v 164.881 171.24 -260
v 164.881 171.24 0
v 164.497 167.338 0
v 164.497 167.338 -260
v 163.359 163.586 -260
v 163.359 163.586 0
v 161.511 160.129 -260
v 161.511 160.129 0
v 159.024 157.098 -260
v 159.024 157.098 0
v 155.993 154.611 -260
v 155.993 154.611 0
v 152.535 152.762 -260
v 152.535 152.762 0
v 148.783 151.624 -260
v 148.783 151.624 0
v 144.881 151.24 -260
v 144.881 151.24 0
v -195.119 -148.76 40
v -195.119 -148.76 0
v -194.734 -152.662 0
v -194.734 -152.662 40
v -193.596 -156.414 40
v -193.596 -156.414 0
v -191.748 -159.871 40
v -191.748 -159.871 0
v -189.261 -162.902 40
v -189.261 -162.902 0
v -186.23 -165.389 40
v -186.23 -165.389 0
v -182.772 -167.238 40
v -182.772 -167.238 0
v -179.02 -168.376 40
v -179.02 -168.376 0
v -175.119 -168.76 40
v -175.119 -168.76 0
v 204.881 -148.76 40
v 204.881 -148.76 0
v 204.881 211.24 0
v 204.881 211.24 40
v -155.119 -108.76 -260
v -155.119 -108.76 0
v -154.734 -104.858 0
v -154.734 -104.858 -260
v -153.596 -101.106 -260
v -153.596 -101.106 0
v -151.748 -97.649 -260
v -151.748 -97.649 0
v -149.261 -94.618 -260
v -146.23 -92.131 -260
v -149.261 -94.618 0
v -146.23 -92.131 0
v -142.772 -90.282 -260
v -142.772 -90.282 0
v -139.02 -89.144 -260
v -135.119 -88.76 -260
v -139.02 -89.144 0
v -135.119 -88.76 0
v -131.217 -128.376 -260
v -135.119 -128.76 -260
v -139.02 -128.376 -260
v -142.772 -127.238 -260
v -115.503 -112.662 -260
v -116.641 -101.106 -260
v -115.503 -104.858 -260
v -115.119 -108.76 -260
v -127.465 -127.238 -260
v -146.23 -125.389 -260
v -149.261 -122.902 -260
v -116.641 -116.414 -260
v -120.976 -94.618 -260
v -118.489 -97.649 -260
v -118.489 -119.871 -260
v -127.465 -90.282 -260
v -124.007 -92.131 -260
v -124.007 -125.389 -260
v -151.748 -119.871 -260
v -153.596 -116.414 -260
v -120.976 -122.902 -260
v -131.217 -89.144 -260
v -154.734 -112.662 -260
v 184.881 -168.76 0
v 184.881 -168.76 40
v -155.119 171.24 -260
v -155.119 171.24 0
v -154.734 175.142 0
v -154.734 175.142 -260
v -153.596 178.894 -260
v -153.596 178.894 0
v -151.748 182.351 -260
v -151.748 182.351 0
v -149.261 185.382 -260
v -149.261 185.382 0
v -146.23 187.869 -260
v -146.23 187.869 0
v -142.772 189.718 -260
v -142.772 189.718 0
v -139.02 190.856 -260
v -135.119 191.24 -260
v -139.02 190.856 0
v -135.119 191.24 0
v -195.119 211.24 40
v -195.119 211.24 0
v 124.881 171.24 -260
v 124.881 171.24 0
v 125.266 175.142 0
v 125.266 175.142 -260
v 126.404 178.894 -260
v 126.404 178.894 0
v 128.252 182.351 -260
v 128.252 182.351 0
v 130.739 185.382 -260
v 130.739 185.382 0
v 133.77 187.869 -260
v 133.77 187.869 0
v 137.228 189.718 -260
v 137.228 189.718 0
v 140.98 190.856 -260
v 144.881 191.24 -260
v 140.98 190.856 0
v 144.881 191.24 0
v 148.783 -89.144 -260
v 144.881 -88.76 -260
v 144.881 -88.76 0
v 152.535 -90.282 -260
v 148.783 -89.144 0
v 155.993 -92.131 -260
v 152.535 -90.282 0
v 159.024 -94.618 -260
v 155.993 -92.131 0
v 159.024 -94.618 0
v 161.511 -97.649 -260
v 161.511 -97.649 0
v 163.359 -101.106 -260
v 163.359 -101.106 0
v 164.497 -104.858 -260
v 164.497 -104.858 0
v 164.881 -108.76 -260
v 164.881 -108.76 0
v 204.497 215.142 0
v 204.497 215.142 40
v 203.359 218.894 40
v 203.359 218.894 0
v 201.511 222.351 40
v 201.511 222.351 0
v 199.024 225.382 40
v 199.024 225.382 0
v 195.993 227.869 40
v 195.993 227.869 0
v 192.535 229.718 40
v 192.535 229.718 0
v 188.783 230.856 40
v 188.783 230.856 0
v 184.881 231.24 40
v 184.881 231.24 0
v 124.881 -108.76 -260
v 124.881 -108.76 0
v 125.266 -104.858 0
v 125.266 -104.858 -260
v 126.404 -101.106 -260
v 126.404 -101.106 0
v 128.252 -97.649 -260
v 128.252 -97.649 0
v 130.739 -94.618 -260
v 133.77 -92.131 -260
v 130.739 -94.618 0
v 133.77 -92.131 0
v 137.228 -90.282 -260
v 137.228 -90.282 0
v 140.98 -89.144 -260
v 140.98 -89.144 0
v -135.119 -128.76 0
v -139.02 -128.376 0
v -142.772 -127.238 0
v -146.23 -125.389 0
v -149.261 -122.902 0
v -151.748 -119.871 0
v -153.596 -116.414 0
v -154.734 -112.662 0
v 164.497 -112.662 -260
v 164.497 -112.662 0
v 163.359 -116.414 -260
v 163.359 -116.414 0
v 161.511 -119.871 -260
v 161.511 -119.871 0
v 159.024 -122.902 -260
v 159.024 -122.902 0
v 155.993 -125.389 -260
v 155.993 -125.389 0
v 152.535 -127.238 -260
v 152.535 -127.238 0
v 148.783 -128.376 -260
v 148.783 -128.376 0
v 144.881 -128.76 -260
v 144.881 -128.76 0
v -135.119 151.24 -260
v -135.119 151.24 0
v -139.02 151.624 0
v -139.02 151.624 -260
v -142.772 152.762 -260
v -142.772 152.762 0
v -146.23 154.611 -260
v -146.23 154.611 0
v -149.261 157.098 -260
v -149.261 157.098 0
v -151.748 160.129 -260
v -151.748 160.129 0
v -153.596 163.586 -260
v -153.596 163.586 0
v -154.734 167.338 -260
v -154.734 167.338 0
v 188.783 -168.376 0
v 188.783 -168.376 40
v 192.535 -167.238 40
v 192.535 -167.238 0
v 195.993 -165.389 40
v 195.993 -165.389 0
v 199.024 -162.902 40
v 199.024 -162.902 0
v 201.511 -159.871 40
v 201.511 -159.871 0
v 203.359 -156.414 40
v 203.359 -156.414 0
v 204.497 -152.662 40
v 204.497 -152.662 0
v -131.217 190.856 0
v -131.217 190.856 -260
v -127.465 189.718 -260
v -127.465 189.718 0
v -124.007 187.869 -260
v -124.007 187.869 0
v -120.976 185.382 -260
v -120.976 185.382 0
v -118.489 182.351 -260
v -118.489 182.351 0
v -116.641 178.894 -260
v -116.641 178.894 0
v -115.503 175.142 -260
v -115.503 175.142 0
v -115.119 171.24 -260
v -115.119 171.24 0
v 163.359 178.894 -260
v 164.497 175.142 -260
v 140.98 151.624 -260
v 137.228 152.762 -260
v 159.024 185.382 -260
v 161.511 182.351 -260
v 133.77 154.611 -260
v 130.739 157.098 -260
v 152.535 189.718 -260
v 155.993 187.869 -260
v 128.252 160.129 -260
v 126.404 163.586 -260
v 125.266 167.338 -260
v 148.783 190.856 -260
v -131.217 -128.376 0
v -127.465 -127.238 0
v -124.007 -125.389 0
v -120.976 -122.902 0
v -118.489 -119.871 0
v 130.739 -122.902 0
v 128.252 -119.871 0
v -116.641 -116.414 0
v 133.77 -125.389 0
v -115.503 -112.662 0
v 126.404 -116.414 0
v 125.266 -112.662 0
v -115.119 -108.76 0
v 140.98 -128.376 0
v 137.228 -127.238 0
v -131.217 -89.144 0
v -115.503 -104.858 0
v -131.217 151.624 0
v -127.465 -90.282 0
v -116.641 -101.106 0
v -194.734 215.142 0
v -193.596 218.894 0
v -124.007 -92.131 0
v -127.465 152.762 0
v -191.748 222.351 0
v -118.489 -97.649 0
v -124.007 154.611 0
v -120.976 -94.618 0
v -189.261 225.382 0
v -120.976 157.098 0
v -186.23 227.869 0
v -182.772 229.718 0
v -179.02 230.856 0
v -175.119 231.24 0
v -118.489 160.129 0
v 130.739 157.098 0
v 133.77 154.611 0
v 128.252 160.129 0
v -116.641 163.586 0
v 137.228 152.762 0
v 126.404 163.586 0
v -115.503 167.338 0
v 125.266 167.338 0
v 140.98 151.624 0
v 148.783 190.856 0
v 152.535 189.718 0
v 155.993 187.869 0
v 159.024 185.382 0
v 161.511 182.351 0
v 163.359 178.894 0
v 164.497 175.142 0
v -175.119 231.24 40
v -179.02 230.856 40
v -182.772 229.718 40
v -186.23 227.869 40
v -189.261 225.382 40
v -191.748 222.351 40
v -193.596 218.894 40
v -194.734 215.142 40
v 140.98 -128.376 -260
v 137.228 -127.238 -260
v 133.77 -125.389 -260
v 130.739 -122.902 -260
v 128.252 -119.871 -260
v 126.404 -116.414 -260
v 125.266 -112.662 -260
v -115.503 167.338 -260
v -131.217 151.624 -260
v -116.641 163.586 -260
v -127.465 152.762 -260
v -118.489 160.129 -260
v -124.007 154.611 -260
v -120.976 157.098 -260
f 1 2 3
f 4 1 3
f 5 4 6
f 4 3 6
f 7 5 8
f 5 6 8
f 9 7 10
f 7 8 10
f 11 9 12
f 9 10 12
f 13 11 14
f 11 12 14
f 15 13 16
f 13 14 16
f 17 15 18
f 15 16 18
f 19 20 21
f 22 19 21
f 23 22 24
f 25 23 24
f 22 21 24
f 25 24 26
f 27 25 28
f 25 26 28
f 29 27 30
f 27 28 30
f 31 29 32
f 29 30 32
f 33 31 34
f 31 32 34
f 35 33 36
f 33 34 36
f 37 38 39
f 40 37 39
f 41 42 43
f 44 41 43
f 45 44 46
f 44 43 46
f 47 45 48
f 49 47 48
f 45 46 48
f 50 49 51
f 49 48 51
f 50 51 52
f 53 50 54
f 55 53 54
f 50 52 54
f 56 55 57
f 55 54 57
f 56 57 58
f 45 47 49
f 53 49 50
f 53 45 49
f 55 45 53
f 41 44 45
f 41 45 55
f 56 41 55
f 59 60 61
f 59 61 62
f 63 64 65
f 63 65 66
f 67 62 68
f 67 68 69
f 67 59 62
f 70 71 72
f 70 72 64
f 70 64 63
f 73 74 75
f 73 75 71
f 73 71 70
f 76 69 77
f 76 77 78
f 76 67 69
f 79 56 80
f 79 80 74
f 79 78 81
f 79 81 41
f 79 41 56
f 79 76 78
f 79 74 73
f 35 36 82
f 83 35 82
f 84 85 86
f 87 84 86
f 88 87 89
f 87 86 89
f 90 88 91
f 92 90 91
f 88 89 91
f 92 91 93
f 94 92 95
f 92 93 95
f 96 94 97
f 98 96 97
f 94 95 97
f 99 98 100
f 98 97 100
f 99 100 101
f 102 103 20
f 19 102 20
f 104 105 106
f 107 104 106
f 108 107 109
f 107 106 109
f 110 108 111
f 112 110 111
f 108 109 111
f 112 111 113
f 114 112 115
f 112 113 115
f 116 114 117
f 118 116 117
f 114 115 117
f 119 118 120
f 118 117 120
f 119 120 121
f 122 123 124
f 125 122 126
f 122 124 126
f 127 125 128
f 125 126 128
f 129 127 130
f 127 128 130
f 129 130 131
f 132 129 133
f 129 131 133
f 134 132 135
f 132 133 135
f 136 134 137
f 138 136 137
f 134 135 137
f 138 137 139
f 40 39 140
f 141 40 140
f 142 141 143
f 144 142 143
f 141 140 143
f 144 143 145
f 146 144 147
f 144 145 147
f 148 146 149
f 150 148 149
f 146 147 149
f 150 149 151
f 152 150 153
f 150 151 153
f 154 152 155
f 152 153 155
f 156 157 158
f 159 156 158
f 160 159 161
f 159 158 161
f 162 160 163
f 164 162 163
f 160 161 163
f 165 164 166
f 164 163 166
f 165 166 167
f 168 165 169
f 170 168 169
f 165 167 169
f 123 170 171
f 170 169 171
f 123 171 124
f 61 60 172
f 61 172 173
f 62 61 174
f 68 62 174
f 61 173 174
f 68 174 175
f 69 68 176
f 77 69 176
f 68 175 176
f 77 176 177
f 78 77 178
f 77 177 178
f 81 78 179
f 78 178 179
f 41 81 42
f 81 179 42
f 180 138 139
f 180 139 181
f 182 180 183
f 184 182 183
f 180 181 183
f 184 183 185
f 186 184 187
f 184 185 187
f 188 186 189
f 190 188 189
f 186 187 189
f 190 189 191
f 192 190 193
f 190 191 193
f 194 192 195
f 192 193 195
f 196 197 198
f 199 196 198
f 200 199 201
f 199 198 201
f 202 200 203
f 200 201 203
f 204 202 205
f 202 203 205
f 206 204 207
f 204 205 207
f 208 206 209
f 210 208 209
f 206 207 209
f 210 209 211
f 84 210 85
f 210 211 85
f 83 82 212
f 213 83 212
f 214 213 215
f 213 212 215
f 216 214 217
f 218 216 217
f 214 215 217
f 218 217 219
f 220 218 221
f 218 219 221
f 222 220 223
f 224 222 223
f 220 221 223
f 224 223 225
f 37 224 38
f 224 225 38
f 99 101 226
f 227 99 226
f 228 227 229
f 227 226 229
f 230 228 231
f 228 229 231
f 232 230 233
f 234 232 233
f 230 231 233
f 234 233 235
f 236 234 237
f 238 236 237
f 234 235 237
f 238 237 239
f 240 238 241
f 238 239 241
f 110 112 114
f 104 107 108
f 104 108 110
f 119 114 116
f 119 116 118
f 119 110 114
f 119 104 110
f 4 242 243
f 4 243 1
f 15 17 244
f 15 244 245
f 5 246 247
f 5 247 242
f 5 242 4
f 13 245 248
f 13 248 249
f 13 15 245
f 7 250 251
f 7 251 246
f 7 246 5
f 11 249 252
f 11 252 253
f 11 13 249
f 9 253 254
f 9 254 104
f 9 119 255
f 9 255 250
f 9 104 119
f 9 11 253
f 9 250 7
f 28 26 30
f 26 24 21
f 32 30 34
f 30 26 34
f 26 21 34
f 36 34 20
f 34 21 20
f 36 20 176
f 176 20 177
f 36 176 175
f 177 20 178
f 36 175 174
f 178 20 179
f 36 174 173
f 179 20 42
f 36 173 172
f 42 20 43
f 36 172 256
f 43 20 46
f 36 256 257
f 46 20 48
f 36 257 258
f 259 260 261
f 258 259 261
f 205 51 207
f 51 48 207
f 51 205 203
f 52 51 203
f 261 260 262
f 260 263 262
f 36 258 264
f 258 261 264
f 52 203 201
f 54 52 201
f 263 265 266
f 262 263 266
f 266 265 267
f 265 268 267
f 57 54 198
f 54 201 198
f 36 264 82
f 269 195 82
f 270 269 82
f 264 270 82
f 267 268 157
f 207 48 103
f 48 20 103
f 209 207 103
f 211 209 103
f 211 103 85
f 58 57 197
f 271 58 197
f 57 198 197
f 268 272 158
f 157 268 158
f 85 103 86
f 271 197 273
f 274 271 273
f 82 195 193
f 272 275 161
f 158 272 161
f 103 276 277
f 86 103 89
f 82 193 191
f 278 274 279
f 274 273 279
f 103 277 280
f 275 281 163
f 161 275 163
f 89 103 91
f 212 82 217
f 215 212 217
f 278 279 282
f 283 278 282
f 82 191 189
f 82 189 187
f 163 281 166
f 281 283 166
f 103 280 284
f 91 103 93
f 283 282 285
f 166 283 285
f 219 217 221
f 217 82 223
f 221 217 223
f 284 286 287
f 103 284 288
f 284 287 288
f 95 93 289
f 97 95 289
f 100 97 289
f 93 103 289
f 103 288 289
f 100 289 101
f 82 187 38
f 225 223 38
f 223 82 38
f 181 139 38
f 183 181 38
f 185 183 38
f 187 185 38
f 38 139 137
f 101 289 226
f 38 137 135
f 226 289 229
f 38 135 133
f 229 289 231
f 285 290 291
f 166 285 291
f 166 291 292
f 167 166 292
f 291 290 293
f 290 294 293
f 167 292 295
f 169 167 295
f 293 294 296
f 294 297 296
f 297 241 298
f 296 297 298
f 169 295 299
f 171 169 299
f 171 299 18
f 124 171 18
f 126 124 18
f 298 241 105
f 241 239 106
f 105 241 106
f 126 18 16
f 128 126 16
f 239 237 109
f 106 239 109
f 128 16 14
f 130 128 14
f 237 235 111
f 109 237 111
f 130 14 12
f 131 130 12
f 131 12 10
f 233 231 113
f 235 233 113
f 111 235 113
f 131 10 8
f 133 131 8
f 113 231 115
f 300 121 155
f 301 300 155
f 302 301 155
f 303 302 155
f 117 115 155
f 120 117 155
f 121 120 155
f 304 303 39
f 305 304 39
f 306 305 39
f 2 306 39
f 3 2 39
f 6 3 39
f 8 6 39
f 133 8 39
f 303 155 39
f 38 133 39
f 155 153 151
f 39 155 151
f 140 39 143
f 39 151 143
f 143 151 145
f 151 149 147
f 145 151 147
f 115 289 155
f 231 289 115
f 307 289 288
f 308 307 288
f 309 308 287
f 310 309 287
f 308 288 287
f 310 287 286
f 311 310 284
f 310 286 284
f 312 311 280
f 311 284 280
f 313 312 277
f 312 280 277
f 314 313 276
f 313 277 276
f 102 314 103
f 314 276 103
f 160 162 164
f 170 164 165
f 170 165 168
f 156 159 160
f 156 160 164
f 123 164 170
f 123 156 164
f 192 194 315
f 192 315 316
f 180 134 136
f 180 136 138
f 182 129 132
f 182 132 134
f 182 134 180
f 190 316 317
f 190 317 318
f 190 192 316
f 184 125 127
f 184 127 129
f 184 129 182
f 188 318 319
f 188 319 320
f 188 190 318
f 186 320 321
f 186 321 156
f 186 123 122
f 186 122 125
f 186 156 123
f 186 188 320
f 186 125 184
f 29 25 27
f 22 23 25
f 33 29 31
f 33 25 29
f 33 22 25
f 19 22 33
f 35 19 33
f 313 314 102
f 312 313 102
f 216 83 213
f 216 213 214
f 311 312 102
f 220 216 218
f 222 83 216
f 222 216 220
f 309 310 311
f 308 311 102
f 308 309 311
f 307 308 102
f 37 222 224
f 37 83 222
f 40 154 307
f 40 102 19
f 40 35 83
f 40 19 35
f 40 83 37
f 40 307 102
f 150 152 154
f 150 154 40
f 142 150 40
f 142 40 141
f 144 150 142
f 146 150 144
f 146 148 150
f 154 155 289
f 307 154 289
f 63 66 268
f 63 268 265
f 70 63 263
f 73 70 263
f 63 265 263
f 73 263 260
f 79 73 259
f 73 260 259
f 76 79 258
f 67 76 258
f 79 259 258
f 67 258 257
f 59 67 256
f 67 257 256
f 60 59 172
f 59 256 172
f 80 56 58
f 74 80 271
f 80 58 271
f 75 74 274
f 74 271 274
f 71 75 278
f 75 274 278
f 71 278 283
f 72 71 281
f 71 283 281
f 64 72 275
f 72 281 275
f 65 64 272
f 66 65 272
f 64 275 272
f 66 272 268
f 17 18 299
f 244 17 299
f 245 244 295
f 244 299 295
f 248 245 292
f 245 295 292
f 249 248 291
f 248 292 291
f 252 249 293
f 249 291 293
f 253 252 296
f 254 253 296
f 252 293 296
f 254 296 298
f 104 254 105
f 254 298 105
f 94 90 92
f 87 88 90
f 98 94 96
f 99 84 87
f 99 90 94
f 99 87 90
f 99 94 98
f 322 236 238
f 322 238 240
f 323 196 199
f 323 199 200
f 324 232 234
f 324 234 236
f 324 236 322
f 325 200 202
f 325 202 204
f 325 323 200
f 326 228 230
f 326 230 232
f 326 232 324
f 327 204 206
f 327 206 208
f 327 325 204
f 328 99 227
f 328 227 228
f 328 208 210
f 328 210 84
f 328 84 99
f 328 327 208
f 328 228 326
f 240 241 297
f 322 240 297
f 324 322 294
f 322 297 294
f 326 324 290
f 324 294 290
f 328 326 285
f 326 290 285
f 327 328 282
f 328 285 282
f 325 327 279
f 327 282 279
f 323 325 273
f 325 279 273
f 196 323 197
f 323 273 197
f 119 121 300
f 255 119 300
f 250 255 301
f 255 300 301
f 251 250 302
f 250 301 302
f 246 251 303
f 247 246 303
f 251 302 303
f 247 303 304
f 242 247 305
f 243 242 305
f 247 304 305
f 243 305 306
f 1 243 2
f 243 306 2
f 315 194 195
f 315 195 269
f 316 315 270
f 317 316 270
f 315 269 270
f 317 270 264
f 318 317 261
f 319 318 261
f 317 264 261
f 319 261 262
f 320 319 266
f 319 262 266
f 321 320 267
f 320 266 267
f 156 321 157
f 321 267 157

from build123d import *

# Parameters (mm, degrees)
F1_DEPTH = 40
F3_DEPTH = 260


with BuildPart() as f1:
    # F0 (on Top) → F1 (new body)
    with BuildSketch(Plane.XY):
        with BuildLine():
            Line((184.88144, 231.240067), (-175.11856, 231.240067))
            ThreePointArc((-175.11856, 231.240067), (-189.260696, 225.382203), (-195.11856, 211.240067))
            Line((-195.11856, 211.240067), (-195.11856, -148.759933))
            ThreePointArc((-195.11856, -148.759933), (-189.260696, -162.902068), (-175.11856, -168.759933))
            Line((-175.11856, -168.759933), (184.88144, -168.759933))
            ThreePointArc((184.88144, -168.759933), (199.023575, -162.902068), (204.88144, -148.759933))
            Line((204.88144, -148.759933), (204.88144, 211.240067))
            ThreePointArc((204.88144, 211.240067), (199.023575, 225.382203), (184.88144, 231.240067))
        make_face()
    extrude(amount=F1_DEPTH)

    # F2 (on face) → F3 (join)
    with BuildSketch(Plane(origin=(0, 0, 0), x_dir=(1, 0, 0), z_dir=(0, 0, -1))):
        with BuildLine():
            ThreePointArc((-135.11856, -191.240067), (-120.976425, -185.382203), (-115.11856, -171.240067))
            ThreePointArc((-115.11856, -171.240067), (-120.976425, -157.097932), (-135.11856, -151.240067))
            ThreePointArc((-135.11856, -151.240067), (-149.260696, -157.097932), (-155.11856, -171.240067))
            ThreePointArc((-155.11856, -171.240067), (-149.260696, -185.382203), (-135.11856, -191.240067))
        make_face()
        with BuildLine():
            ThreePointArc((-135.11856, 88.759933), (-120.976425, 94.617797), (-115.11856, 108.759933))
            ThreePointArc((-115.11856, 108.759933), (-120.976425, 122.902068), (-135.11856, 128.759933))
            ThreePointArc((-135.11856, 128.759933), (-149.260696, 122.902068), (-155.11856, 108.759933))
            ThreePointArc((-155.11856, 108.759933), (-149.260696, 94.617797), (-135.11856, 88.759933))
        make_face()
        with BuildLine():
            ThreePointArc((144.88144, 128.759933), (130.739304, 122.902068), (124.88144, 108.759933))
            ThreePointArc((124.88144, 108.759933), (130.739304, 94.617797), (144.88144, 88.759933))
            ThreePointArc((144.88144, 88.759933), (159.023575, 94.617797), (164.88144, 108.759933))
            ThreePointArc((164.88144, 108.759933), (159.023575, 122.902068), (144.88144, 128.759933))
        make_face()
        with BuildLine():
            ThreePointArc((164.88144, -171.240067), (159.023575, -157.097932), (144.88144, -151.240067))
            ThreePointArc((144.88144, -151.240067), (130.739304, -157.097932), (124.88144, -171.240067))
            ThreePointArc((124.88144, -171.240067), (130.739304, -185.382203), (144.88144, -191.240067))
            ThreePointArc((144.88144, -191.240067), (159.023575, -185.382203), (164.88144, -171.240067))
        make_face()
    extrude(amount=F3_DEPTH)


solid = f1.part
